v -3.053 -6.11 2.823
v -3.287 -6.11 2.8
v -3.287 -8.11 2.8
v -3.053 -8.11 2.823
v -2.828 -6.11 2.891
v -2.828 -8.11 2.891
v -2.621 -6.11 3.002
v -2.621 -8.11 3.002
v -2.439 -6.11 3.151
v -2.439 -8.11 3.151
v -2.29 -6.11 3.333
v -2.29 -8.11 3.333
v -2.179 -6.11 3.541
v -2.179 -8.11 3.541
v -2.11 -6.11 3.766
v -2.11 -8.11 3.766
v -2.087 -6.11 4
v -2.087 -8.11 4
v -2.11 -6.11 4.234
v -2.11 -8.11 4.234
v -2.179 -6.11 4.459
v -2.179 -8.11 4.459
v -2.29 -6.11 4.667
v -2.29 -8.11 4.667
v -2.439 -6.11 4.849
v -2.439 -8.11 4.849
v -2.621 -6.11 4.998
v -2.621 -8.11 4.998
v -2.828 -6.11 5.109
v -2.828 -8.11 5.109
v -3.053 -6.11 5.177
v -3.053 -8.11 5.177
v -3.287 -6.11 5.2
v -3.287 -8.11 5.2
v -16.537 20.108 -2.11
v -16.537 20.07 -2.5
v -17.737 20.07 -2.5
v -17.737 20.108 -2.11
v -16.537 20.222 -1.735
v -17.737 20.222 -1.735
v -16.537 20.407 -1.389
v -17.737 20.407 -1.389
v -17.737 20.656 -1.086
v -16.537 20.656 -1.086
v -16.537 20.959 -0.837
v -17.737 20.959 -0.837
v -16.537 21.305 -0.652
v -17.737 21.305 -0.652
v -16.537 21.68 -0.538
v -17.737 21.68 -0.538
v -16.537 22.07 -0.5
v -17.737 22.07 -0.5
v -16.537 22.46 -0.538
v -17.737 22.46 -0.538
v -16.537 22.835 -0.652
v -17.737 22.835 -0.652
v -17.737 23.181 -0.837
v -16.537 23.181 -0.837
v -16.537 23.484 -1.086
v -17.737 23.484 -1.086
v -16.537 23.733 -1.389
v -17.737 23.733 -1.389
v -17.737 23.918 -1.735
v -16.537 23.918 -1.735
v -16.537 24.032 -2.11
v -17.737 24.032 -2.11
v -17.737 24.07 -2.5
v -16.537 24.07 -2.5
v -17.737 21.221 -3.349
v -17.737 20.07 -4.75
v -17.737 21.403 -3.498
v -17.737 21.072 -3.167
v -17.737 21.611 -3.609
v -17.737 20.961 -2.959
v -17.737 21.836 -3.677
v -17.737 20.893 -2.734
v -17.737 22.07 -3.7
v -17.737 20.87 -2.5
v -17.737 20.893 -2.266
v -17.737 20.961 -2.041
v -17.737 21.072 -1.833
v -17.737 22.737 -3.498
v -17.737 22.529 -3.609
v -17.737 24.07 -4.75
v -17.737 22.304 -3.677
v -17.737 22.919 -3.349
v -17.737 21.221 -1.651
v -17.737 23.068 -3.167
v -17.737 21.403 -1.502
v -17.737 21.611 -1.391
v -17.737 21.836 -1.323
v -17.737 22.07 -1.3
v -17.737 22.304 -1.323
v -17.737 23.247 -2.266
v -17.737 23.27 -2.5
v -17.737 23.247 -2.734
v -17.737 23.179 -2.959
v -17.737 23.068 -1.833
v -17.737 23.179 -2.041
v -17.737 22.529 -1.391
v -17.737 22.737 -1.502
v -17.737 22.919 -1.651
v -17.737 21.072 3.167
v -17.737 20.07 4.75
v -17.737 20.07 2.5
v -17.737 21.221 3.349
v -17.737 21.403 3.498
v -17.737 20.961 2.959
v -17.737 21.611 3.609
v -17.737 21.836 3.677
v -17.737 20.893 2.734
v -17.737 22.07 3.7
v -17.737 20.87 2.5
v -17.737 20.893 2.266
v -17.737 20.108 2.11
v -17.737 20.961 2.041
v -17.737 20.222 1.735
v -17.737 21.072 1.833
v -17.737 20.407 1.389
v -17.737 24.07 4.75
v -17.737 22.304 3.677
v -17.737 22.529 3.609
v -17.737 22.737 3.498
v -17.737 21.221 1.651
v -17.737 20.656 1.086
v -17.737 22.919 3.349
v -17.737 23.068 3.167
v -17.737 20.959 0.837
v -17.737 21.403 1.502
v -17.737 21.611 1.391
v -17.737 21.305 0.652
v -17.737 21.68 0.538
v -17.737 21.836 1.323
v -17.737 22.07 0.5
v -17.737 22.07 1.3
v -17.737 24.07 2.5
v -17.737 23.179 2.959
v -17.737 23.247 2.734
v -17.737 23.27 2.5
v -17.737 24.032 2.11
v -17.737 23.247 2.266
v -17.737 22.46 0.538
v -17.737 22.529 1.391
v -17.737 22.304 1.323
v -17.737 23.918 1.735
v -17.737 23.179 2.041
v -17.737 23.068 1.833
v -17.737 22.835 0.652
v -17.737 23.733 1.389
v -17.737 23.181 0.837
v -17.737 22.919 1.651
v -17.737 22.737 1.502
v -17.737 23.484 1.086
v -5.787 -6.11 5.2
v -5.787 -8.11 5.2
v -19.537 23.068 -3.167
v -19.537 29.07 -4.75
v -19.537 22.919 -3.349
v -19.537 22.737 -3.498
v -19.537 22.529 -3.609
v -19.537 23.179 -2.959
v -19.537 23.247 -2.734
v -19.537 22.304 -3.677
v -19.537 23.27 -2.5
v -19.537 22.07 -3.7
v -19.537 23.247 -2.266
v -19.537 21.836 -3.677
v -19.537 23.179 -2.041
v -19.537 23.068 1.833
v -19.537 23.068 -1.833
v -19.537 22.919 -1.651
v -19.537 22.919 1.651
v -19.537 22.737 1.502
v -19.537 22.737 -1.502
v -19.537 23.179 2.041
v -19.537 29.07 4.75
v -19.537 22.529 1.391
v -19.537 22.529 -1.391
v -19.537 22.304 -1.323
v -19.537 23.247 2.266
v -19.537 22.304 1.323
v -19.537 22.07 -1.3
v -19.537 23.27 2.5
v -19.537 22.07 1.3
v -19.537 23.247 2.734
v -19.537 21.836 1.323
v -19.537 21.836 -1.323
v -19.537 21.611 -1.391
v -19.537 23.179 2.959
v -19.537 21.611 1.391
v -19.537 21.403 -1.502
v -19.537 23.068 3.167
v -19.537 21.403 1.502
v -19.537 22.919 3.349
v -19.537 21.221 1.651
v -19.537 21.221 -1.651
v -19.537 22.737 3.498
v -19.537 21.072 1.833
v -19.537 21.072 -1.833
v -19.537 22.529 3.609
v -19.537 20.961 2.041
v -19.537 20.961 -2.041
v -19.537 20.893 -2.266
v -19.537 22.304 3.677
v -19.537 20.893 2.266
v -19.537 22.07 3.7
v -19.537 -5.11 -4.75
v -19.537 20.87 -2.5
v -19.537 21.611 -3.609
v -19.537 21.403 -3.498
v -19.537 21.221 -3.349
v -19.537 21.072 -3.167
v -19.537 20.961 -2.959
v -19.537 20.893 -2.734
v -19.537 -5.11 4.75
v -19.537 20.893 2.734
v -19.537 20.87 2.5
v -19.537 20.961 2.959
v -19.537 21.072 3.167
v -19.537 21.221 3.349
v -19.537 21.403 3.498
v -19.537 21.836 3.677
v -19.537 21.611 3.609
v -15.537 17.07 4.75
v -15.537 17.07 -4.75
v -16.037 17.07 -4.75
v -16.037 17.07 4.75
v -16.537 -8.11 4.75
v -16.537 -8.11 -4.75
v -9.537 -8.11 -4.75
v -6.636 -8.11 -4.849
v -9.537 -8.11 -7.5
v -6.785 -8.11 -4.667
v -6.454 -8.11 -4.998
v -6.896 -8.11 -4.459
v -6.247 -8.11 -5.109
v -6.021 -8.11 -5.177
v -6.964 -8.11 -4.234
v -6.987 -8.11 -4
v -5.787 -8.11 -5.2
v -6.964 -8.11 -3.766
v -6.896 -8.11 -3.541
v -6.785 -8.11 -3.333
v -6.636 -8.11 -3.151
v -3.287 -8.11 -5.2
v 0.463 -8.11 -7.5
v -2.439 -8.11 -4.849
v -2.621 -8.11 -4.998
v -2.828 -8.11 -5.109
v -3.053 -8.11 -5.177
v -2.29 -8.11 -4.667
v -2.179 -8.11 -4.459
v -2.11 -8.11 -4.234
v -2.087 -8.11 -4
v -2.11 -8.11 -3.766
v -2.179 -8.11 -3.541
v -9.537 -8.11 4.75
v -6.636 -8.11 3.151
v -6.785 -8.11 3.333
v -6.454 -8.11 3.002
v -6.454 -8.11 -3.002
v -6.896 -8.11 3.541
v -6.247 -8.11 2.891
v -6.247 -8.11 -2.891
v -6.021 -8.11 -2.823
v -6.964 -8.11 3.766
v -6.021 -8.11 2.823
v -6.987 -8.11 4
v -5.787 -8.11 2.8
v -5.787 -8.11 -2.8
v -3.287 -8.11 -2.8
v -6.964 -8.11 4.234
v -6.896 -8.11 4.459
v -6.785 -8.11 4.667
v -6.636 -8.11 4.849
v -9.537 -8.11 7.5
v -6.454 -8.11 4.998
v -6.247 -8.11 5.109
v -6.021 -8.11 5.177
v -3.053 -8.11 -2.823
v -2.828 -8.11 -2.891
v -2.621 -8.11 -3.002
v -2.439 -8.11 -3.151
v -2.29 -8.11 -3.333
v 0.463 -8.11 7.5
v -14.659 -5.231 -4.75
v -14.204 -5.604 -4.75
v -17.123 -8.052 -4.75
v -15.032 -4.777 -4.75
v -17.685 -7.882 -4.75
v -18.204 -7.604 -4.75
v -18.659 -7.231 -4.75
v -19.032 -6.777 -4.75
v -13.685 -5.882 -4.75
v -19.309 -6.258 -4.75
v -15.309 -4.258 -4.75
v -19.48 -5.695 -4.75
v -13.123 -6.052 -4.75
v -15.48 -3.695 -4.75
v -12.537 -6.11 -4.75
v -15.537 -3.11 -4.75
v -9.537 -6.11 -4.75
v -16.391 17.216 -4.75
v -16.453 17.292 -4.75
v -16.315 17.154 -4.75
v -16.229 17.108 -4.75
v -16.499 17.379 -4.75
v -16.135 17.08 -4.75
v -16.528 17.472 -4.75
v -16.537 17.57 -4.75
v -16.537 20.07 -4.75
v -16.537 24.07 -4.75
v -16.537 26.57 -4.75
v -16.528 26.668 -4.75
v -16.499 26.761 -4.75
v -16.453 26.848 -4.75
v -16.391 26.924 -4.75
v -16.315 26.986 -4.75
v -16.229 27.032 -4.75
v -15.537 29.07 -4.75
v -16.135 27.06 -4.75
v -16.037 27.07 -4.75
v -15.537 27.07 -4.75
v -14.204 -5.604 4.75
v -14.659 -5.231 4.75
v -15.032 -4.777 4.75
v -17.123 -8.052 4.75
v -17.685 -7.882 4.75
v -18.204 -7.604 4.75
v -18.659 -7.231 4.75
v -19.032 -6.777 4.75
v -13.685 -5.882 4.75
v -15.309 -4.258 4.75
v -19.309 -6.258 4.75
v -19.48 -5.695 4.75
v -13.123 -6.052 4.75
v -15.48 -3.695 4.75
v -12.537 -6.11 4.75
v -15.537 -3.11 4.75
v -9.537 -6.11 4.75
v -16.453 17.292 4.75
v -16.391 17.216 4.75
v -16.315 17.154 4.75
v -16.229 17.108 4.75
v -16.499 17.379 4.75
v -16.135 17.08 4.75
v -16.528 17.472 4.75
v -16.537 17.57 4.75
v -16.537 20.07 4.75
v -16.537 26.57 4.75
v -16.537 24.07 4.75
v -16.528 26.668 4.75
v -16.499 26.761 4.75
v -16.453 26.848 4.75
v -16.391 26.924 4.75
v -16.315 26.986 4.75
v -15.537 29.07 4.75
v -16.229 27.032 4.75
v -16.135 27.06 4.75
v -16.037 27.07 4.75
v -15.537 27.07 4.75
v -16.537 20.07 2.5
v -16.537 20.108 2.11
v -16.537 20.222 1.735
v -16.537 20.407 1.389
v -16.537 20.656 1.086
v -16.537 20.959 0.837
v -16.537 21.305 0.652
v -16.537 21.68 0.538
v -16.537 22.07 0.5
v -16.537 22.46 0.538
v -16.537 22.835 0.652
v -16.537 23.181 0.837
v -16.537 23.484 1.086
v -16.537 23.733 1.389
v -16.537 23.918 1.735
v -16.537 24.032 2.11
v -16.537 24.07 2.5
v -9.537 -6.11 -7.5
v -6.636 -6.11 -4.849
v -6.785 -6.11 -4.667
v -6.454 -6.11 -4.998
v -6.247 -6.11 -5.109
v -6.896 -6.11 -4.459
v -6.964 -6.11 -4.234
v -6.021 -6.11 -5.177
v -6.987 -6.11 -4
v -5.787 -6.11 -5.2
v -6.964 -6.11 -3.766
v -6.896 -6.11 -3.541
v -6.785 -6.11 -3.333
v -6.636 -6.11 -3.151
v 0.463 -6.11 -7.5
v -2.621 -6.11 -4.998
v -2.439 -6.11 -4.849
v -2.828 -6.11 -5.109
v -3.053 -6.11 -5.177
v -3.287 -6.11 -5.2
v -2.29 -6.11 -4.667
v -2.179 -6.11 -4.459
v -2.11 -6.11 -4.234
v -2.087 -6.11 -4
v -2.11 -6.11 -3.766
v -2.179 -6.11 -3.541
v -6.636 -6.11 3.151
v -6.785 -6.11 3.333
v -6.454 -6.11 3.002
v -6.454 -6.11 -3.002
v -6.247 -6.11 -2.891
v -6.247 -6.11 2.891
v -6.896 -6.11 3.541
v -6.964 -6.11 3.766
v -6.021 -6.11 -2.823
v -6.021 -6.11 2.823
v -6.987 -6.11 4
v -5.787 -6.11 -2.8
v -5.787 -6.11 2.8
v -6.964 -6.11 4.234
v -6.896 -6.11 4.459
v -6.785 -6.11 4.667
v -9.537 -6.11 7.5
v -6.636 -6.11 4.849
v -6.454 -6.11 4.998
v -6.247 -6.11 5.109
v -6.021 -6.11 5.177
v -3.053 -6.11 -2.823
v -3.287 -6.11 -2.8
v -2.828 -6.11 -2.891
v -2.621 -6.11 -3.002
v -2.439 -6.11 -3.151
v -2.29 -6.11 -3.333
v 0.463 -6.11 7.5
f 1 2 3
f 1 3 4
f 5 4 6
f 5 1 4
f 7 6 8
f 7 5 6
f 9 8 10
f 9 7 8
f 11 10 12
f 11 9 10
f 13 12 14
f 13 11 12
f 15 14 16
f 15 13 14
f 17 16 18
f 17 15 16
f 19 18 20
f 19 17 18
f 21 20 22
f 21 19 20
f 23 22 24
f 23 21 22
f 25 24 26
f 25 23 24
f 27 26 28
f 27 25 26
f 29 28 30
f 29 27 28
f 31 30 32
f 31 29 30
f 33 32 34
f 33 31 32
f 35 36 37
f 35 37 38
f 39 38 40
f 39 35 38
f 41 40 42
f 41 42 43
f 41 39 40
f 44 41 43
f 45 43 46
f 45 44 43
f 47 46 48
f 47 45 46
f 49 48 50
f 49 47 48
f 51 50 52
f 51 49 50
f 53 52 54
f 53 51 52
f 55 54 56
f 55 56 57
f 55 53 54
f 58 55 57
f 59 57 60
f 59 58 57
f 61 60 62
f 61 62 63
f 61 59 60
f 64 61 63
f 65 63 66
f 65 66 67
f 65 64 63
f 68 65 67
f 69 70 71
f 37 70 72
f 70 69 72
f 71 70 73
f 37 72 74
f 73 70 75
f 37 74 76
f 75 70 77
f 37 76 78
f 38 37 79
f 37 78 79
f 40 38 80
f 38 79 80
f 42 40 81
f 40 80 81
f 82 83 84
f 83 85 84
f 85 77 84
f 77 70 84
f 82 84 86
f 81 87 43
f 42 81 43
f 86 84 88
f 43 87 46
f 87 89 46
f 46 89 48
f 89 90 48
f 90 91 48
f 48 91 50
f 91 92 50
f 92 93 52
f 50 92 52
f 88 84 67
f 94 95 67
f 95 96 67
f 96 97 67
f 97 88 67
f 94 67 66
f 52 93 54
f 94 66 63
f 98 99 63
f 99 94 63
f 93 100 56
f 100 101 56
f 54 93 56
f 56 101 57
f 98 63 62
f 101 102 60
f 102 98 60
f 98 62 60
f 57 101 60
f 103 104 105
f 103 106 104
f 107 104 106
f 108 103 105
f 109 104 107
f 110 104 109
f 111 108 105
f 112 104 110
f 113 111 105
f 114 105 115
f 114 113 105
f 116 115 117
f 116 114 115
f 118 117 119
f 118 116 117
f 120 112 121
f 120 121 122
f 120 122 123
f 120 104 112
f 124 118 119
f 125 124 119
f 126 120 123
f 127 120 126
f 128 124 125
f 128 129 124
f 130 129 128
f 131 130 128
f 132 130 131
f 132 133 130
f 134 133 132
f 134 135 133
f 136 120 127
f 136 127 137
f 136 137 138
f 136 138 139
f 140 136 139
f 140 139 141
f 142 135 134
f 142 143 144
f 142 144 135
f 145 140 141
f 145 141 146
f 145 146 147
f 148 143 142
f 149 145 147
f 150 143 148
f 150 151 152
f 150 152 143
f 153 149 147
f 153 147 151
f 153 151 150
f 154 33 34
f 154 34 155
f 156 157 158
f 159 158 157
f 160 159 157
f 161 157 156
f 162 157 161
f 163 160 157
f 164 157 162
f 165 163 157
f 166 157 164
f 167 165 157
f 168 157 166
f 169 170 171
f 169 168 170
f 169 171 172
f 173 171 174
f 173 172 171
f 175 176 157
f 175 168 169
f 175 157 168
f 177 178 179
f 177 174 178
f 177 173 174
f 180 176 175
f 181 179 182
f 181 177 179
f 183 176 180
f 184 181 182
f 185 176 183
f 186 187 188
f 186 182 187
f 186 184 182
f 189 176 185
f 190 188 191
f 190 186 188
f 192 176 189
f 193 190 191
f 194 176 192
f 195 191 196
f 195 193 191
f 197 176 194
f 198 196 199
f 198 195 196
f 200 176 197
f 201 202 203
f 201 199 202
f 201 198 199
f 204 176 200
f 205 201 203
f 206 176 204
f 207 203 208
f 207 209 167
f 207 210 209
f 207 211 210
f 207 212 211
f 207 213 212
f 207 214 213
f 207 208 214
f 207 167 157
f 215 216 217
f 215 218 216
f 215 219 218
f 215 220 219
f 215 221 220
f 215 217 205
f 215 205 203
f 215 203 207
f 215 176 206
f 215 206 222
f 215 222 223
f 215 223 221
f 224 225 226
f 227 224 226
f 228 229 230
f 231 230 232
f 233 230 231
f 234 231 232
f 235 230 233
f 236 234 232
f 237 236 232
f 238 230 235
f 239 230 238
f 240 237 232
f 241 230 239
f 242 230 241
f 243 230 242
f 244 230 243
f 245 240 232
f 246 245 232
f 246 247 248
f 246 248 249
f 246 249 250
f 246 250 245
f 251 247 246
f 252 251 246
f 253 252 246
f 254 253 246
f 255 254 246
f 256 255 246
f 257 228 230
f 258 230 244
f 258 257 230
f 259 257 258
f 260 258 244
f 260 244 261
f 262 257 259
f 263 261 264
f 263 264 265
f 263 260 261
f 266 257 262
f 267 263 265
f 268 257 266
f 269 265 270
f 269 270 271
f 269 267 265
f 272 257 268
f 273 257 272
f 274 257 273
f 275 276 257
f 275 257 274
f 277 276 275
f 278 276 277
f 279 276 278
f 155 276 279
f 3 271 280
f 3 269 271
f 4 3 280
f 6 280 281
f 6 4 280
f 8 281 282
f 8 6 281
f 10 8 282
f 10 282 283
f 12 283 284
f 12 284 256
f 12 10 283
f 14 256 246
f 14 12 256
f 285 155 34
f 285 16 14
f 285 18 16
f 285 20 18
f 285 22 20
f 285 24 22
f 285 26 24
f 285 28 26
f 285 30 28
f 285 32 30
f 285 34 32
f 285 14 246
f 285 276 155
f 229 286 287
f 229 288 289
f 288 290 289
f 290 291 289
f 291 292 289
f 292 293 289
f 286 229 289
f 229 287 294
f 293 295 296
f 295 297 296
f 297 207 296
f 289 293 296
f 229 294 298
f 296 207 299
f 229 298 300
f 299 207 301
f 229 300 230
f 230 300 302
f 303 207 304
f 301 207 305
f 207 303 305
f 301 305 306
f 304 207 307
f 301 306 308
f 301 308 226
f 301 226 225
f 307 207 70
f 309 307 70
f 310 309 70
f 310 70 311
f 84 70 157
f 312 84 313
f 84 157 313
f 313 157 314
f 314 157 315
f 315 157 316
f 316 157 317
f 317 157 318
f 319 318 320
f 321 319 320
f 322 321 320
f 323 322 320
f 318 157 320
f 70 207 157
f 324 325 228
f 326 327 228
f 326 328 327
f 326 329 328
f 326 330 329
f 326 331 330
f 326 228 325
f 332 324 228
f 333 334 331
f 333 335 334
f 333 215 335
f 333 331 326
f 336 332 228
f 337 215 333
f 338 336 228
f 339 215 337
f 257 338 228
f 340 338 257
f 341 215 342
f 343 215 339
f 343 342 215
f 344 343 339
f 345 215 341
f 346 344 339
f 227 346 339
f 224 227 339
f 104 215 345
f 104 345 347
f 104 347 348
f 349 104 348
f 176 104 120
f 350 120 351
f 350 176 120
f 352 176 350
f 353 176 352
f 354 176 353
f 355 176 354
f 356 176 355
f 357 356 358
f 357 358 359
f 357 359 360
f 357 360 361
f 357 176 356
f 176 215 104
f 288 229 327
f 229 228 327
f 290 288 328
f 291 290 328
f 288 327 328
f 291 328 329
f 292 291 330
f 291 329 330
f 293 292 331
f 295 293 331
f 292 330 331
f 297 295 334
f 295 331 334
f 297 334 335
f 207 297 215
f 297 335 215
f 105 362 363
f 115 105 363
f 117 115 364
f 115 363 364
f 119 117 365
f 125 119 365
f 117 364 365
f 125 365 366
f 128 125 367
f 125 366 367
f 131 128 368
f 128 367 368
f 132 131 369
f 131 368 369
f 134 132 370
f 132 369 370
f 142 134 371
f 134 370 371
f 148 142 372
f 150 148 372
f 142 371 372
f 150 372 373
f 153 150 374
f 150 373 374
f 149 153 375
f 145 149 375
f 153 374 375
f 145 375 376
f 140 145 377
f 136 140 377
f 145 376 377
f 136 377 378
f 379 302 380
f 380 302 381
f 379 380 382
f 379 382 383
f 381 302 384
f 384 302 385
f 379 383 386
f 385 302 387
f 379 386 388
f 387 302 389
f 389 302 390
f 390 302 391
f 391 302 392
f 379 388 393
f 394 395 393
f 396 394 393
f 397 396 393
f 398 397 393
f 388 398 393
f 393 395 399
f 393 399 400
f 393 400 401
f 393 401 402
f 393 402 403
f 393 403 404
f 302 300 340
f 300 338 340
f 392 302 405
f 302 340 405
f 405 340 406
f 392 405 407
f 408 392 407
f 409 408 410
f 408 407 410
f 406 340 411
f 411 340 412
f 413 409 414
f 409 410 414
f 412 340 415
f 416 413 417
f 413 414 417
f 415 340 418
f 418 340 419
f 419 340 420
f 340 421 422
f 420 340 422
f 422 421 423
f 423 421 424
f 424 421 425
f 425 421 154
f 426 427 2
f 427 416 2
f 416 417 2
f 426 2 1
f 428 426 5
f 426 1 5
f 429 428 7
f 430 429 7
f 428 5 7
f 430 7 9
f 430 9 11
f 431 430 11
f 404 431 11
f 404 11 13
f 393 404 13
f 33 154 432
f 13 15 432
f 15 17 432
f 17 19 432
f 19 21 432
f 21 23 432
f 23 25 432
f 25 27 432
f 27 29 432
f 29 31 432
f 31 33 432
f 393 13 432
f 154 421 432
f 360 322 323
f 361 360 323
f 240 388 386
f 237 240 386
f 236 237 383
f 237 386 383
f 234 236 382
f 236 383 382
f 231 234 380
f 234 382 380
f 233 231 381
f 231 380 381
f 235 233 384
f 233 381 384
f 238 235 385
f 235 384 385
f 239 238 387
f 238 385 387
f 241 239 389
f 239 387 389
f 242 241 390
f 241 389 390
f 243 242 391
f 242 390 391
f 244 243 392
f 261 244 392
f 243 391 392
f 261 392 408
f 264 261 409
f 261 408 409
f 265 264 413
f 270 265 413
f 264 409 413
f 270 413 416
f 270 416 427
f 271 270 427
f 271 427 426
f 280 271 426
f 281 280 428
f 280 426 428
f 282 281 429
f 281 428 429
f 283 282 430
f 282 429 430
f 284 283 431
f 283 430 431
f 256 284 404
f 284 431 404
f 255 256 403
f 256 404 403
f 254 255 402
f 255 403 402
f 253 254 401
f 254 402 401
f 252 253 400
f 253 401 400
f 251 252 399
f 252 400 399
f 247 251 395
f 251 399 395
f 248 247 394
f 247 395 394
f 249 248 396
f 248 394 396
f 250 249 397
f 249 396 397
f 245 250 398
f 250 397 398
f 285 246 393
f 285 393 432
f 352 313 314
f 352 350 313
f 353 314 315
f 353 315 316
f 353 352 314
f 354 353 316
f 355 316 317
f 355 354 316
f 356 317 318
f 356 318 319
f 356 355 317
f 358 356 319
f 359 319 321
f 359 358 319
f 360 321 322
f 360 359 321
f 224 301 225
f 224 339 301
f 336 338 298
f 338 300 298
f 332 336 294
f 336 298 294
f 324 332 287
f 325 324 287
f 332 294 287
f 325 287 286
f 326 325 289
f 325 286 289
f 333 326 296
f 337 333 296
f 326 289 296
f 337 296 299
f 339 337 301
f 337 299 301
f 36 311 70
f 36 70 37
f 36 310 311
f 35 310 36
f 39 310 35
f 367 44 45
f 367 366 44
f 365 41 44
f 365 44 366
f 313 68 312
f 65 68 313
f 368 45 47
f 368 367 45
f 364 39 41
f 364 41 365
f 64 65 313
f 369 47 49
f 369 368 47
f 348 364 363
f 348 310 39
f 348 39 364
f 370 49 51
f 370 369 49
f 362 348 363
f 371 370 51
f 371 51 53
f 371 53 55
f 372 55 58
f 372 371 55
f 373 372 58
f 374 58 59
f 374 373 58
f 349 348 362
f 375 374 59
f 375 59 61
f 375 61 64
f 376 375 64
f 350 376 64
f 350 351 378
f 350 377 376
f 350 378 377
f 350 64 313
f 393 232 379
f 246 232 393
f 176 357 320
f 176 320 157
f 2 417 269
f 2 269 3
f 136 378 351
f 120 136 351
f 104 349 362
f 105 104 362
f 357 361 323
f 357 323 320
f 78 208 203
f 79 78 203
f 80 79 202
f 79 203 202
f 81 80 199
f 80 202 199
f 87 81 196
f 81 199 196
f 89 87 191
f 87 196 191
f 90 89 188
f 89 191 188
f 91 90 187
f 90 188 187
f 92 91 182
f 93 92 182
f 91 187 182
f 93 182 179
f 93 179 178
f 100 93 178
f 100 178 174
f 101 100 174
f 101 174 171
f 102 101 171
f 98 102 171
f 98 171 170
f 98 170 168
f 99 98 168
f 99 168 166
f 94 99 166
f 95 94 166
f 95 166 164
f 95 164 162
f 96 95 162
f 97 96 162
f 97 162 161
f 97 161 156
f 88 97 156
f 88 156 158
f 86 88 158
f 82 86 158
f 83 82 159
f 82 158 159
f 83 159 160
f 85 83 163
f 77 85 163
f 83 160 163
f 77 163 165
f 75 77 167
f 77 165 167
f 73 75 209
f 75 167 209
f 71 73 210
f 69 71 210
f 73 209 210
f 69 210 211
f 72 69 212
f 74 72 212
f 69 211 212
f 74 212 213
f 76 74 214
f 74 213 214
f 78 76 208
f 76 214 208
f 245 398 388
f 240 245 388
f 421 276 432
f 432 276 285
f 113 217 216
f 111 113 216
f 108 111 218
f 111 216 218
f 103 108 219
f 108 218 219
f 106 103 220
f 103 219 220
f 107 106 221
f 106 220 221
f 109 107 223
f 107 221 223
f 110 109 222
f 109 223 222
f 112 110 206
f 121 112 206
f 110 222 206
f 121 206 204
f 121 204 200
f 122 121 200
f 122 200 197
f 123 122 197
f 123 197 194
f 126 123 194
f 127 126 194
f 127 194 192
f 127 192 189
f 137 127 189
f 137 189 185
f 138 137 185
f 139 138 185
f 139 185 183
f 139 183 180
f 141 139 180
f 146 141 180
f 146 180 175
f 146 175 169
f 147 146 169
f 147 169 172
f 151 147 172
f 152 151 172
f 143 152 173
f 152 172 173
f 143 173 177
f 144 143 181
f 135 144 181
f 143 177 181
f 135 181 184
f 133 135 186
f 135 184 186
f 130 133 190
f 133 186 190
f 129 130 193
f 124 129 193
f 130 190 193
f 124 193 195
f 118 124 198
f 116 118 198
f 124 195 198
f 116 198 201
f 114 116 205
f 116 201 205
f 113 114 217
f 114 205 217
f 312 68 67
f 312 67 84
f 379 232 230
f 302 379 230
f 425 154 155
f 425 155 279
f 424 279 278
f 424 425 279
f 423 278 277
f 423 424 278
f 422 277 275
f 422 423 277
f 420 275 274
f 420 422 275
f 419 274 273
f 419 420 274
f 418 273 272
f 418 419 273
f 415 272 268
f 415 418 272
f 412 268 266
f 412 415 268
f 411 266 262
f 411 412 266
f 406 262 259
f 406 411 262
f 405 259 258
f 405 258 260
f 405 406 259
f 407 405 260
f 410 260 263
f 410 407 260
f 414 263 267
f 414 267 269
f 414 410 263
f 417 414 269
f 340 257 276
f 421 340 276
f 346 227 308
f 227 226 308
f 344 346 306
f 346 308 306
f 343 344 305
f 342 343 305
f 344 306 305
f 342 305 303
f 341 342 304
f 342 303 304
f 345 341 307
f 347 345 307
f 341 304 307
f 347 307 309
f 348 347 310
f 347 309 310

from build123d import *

# Parameters (mm, degrees)
BOSS_EXTRUDE1_DEPTH  = 4.75
M2_CLEARANCE_HOLE1_D = 2.4
CUT_EXTRUDE1_DEPTH   = 1.2
SKETCH5_W            = 10
SKETCH5_H            = 15
BOSS_EXTRUDE2_DEPTH  = 2
CUT_EXTRUDE2_DEPTH   = 2
FILLET1_R            = 3
FILLET2_R            = 0.5


with BuildPart() as part:
    # Sketch1 → Boss-Extrude1 (new, symmetric)
    with BuildSketch(Plane.XY):
        Polygon((-16.53737418, 17.07), (-16.53737418, 27.07), (-15.53737418, 27.07), (-15.53737418, 29.07), (-19.53737418, 29.07), (-19.53737418, 0), (-19.53737418, -8.11), (-11.42737418, -8.11), (0.46262582, -8.11), (0.46262582, -6.11), (-15.42737418, -6.11), (-15.53737418, -6.11), (-15.53737418, 14.07), (-15.53737418, 17.07), align=None)
    extrude(amount=BOSS_EXTRUDE1_DEPTH, both=True)

    # M2 Clearance Hole1 (through all)
    with Locations(Plane(origin=(-16.53737418, 22.07, 2.5), x_dir=(0, 1, 0), z_dir=(1, 0, 0))):
        with Locations((0, 0), (0, -5)):
            Hole(M2_CLEARANCE_HOLE1_D / 2)

    # Sketch4 → Cut-Extrude1 (cut)
    with BuildSketch(Plane(origin=(-16.53737418, 0, 0), x_dir=(0, 0, -1), z_dir=(1, 0, 0))):
        with BuildLine():
            Line((-2.5, 24.07), (-4.75, 24.07))
            Line((-4.75, 24.07), (-4.75, 20.07))
            Line((-4.75, 20.07), (-2.5, 20.07))
            ThreePointArc((-2.5, 20.07), (-0.5, 22.07), (-2.5, 24.07))
        make_face()
        with BuildLine():
            Line((4.75, 20.07), (2.5, 20.07))
            ThreePointArc((2.5, 20.07), (0.5, 22.07), (2.5, 24.07))
            Line((2.5, 24.07), (4.75, 24.07))
            Line((4.75, 24.07), (4.75, 20.07))
        make_face()
    extrude(amount=-CUT_EXTRUDE1_DEPTH, mode=Mode.SUBTRACT)

    # Sketch5 → Boss-Extrude2 (add)
    with BuildSketch(Plane.XZ.offset(8.11)):
        with Locations((-4.53737418, 0)):
            Rectangle(SKETCH5_W, SKETCH5_H)
    extrude(amount=-BOSS_EXTRUDE2_DEPTH)

    # Sketch6 → Cut-Extrude2 (cut)
    with BuildSketch(Plane(origin=(0, -6.11, 0), x_dir=(1, 0, 0), z_dir=(0, 1, 0))):
        with BuildLine():
            Line((-3.28737418, -5.2), (-5.78737418, -5.2))
            ThreePointArc((-5.78737418, -5.2), (-6.98737418, -4), (-5.78737418, -2.8))
            Line((-5.78737418, -2.8), (-3.28737418, -2.8))
            ThreePointArc((-3.28737418, -2.8), (-2.08737418, -4), (-3.28737418, -5.2))
        make_face()
        with BuildLine():
            Line((-3.28737418, 5.2), (-5.78737418, 5.2))
            ThreePointArc((-5.78737418, 5.2), (-6.98737418, 4), (-5.78737418, 2.8))
            Line((-5.78737418, 2.8), (-3.28737418, 2.8))
            ThreePointArc((-3.28737418, 2.8), (-2.08737418, 4), (-3.28737418, 5.2))
        make_face()
    extrude(amount=-CUT_EXTRUDE2_DEPTH, mode=Mode.SUBTRACT)

    # Fillet1
    fillet1_edges = [part.edges().sort_by_distance(p)[0] for p in [
        (-15.53737418, -6.11, 0),
        (-19.53737418, -8.11, 0),
    ]]
    fillet(fillet1_edges, radius=FILLET1_R)

    # Fillet2
    fillet2_edges = [part.edges().sort_by_distance(p)[0] for p in [
        (-16.53737418, 27.07, 0),
        (-16.53737418, 17.07, 0),
    ]]
    fillet(fillet2_edges, radius=FILLET2_R)


solid = part.part
